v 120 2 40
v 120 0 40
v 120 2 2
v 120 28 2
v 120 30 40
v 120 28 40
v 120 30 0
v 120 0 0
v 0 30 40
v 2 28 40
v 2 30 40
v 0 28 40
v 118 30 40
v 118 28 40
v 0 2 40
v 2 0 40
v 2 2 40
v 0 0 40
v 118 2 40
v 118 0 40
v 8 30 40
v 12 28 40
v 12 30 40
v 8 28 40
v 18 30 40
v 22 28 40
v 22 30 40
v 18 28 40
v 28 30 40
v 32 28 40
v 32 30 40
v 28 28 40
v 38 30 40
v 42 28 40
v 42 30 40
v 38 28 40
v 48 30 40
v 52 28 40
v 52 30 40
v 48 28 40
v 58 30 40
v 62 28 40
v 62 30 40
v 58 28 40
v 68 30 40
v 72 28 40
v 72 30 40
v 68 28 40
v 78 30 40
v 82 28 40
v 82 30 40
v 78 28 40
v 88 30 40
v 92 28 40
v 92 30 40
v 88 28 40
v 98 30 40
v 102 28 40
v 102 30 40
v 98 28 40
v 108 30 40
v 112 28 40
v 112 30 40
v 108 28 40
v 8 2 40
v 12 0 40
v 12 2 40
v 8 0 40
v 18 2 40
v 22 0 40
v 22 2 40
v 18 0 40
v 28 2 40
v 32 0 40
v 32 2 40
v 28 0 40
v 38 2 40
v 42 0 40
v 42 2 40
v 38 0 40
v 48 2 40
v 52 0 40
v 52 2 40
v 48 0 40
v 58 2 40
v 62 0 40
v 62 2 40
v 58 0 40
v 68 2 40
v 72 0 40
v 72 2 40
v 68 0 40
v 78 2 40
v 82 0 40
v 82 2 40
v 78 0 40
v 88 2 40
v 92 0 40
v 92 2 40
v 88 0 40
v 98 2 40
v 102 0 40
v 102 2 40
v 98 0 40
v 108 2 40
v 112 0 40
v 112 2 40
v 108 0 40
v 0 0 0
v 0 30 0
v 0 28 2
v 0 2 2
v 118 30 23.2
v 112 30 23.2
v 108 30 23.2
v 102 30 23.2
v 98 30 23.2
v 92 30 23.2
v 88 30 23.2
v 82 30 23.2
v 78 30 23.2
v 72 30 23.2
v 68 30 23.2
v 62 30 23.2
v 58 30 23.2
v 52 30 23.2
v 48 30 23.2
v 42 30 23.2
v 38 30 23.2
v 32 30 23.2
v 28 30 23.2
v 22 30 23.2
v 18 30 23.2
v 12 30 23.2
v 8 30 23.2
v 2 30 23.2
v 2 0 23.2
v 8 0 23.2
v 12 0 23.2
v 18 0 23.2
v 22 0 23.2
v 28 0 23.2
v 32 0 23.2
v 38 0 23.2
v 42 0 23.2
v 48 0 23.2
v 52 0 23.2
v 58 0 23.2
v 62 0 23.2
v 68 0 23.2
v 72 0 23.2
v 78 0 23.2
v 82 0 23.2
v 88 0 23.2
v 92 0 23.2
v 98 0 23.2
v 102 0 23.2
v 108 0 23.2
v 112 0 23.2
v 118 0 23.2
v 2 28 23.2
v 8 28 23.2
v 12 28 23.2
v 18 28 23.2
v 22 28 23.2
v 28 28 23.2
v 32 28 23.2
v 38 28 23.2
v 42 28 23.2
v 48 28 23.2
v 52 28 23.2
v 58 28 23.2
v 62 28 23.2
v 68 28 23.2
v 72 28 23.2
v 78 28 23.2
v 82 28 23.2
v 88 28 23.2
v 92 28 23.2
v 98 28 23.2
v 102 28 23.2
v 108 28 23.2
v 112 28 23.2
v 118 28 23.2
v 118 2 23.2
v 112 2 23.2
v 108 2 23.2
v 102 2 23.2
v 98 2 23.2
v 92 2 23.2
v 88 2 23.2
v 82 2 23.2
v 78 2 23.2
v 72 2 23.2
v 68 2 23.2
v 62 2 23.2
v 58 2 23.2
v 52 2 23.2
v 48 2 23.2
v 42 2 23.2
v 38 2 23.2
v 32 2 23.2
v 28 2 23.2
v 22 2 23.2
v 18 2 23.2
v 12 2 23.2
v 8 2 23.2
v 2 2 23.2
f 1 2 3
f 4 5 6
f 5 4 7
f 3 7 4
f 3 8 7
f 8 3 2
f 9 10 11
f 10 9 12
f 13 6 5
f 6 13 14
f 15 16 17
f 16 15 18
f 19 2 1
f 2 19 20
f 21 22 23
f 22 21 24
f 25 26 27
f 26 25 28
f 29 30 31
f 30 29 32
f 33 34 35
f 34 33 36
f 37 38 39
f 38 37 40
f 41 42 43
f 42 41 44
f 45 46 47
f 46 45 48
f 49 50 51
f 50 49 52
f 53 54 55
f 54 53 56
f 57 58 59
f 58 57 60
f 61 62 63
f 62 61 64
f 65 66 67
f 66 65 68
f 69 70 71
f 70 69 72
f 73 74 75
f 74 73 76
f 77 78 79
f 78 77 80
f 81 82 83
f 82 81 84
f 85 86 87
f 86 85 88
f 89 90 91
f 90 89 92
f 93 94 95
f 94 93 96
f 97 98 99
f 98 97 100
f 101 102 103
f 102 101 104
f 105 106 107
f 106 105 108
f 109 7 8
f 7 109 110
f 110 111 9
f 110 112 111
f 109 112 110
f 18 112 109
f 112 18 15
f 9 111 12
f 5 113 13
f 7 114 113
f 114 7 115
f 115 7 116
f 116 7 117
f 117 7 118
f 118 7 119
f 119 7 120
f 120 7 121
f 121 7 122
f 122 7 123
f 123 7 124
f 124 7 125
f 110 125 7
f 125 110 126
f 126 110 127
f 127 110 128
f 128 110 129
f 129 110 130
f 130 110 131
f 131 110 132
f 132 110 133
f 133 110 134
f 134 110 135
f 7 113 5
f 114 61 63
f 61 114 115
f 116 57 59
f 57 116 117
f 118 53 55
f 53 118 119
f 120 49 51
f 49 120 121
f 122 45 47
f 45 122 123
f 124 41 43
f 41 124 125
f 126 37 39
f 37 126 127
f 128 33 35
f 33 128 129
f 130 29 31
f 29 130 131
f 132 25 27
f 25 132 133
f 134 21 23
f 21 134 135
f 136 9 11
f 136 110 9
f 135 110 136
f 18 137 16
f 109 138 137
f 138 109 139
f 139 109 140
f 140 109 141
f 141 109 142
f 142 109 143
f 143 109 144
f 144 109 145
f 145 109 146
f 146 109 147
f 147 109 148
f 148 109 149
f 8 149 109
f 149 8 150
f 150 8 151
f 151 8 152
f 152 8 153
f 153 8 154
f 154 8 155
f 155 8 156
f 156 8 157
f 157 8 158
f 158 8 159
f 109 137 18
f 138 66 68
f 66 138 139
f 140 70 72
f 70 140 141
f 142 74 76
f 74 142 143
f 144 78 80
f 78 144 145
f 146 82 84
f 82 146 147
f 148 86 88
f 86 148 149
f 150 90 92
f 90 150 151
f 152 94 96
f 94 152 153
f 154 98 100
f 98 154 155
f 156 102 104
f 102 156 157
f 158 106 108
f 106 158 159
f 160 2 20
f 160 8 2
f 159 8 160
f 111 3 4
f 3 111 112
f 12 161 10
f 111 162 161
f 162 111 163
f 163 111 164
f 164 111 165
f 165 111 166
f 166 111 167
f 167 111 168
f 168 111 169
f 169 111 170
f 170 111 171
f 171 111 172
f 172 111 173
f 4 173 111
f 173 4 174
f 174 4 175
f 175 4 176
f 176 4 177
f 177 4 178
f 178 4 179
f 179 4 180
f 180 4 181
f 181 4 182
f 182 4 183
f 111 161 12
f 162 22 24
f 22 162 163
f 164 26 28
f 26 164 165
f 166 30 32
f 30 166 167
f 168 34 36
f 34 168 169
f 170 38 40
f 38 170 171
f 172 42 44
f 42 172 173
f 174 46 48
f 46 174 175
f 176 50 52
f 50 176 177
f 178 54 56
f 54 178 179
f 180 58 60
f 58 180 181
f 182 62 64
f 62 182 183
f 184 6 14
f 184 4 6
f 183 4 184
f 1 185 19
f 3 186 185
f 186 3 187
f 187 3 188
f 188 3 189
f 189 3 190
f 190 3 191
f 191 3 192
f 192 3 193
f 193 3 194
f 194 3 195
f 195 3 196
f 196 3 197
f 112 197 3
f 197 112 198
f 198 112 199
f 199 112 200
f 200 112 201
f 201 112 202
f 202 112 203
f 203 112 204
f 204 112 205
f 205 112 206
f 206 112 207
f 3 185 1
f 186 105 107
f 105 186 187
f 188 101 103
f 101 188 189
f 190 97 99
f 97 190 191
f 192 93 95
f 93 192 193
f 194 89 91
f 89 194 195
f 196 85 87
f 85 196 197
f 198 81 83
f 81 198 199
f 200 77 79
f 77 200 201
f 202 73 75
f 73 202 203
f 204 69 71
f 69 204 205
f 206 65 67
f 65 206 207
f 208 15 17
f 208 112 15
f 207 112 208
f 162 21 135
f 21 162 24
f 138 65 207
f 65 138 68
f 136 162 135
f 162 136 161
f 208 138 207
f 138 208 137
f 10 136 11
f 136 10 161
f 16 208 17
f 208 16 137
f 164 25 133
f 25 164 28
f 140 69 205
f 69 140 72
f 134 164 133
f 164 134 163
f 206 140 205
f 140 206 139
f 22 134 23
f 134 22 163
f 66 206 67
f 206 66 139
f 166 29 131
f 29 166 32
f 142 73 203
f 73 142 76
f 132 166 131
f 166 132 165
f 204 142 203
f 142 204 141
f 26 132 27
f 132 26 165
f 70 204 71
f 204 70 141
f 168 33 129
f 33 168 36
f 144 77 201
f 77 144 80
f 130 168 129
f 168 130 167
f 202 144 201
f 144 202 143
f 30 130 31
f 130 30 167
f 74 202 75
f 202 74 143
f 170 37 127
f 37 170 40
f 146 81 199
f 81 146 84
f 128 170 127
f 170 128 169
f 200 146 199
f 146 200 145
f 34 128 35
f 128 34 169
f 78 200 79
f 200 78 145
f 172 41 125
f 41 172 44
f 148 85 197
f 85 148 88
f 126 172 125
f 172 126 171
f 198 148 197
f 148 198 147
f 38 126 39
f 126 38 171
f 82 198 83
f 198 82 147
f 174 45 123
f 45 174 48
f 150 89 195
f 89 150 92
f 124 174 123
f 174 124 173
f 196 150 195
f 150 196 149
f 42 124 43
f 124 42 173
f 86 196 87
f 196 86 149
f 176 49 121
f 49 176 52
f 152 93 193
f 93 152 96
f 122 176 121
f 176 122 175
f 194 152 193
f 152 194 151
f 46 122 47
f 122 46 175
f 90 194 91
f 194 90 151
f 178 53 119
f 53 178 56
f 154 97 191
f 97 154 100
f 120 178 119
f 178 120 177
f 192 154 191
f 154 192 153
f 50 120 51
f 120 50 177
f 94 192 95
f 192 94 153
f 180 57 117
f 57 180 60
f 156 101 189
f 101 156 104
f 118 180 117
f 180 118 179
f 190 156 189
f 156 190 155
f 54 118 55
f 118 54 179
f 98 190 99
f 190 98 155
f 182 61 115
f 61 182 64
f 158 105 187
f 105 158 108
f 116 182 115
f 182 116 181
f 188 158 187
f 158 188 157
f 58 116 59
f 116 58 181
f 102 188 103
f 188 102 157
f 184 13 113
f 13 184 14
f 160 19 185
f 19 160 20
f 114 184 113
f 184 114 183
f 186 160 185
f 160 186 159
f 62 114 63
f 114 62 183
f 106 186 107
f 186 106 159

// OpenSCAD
$fn = 32;

// ----------------------------------------------------------------------
// Cable duct: 120 x 30 x 40 mm, 12 fingers
// ----------------------------------------------------------------------

// --- parameters (mm) ---
duct_len = 120;           // duct length, X
duct_w = 30;              // duct width, Y
duct_h = 40;              // duct height, Z
wall_t = 2;               // side wall thickness
floor_t = 2;              // floor thickness
slot_w = 6;               // finger slot width
slot_h = 21.2;            // finger slot height
fingers = 12;             // number of finger slots per side
pitch = 10;               // finger pitch

module shell() {
  difference() {
    cube([duct_len, duct_w, duct_h]);
    /* open top channel */
    translate([-wall_t - 1, wall_t, floor_t])
      cube([duct_len + 2 * wall_t + 2, duct_w - 2 * wall_t, duct_h + 1]);
  }
}

difference() {
  union() {
    shell();
  }
  /* finger slots cut through both side walls */
  for (i = [0 : fingers - 1]) translate([pitch / 2 + i * pitch - slot_w / 2, -1, floor_t + slot_h]) cube([slot_w, duct_w + 2, duct_h]);
}
